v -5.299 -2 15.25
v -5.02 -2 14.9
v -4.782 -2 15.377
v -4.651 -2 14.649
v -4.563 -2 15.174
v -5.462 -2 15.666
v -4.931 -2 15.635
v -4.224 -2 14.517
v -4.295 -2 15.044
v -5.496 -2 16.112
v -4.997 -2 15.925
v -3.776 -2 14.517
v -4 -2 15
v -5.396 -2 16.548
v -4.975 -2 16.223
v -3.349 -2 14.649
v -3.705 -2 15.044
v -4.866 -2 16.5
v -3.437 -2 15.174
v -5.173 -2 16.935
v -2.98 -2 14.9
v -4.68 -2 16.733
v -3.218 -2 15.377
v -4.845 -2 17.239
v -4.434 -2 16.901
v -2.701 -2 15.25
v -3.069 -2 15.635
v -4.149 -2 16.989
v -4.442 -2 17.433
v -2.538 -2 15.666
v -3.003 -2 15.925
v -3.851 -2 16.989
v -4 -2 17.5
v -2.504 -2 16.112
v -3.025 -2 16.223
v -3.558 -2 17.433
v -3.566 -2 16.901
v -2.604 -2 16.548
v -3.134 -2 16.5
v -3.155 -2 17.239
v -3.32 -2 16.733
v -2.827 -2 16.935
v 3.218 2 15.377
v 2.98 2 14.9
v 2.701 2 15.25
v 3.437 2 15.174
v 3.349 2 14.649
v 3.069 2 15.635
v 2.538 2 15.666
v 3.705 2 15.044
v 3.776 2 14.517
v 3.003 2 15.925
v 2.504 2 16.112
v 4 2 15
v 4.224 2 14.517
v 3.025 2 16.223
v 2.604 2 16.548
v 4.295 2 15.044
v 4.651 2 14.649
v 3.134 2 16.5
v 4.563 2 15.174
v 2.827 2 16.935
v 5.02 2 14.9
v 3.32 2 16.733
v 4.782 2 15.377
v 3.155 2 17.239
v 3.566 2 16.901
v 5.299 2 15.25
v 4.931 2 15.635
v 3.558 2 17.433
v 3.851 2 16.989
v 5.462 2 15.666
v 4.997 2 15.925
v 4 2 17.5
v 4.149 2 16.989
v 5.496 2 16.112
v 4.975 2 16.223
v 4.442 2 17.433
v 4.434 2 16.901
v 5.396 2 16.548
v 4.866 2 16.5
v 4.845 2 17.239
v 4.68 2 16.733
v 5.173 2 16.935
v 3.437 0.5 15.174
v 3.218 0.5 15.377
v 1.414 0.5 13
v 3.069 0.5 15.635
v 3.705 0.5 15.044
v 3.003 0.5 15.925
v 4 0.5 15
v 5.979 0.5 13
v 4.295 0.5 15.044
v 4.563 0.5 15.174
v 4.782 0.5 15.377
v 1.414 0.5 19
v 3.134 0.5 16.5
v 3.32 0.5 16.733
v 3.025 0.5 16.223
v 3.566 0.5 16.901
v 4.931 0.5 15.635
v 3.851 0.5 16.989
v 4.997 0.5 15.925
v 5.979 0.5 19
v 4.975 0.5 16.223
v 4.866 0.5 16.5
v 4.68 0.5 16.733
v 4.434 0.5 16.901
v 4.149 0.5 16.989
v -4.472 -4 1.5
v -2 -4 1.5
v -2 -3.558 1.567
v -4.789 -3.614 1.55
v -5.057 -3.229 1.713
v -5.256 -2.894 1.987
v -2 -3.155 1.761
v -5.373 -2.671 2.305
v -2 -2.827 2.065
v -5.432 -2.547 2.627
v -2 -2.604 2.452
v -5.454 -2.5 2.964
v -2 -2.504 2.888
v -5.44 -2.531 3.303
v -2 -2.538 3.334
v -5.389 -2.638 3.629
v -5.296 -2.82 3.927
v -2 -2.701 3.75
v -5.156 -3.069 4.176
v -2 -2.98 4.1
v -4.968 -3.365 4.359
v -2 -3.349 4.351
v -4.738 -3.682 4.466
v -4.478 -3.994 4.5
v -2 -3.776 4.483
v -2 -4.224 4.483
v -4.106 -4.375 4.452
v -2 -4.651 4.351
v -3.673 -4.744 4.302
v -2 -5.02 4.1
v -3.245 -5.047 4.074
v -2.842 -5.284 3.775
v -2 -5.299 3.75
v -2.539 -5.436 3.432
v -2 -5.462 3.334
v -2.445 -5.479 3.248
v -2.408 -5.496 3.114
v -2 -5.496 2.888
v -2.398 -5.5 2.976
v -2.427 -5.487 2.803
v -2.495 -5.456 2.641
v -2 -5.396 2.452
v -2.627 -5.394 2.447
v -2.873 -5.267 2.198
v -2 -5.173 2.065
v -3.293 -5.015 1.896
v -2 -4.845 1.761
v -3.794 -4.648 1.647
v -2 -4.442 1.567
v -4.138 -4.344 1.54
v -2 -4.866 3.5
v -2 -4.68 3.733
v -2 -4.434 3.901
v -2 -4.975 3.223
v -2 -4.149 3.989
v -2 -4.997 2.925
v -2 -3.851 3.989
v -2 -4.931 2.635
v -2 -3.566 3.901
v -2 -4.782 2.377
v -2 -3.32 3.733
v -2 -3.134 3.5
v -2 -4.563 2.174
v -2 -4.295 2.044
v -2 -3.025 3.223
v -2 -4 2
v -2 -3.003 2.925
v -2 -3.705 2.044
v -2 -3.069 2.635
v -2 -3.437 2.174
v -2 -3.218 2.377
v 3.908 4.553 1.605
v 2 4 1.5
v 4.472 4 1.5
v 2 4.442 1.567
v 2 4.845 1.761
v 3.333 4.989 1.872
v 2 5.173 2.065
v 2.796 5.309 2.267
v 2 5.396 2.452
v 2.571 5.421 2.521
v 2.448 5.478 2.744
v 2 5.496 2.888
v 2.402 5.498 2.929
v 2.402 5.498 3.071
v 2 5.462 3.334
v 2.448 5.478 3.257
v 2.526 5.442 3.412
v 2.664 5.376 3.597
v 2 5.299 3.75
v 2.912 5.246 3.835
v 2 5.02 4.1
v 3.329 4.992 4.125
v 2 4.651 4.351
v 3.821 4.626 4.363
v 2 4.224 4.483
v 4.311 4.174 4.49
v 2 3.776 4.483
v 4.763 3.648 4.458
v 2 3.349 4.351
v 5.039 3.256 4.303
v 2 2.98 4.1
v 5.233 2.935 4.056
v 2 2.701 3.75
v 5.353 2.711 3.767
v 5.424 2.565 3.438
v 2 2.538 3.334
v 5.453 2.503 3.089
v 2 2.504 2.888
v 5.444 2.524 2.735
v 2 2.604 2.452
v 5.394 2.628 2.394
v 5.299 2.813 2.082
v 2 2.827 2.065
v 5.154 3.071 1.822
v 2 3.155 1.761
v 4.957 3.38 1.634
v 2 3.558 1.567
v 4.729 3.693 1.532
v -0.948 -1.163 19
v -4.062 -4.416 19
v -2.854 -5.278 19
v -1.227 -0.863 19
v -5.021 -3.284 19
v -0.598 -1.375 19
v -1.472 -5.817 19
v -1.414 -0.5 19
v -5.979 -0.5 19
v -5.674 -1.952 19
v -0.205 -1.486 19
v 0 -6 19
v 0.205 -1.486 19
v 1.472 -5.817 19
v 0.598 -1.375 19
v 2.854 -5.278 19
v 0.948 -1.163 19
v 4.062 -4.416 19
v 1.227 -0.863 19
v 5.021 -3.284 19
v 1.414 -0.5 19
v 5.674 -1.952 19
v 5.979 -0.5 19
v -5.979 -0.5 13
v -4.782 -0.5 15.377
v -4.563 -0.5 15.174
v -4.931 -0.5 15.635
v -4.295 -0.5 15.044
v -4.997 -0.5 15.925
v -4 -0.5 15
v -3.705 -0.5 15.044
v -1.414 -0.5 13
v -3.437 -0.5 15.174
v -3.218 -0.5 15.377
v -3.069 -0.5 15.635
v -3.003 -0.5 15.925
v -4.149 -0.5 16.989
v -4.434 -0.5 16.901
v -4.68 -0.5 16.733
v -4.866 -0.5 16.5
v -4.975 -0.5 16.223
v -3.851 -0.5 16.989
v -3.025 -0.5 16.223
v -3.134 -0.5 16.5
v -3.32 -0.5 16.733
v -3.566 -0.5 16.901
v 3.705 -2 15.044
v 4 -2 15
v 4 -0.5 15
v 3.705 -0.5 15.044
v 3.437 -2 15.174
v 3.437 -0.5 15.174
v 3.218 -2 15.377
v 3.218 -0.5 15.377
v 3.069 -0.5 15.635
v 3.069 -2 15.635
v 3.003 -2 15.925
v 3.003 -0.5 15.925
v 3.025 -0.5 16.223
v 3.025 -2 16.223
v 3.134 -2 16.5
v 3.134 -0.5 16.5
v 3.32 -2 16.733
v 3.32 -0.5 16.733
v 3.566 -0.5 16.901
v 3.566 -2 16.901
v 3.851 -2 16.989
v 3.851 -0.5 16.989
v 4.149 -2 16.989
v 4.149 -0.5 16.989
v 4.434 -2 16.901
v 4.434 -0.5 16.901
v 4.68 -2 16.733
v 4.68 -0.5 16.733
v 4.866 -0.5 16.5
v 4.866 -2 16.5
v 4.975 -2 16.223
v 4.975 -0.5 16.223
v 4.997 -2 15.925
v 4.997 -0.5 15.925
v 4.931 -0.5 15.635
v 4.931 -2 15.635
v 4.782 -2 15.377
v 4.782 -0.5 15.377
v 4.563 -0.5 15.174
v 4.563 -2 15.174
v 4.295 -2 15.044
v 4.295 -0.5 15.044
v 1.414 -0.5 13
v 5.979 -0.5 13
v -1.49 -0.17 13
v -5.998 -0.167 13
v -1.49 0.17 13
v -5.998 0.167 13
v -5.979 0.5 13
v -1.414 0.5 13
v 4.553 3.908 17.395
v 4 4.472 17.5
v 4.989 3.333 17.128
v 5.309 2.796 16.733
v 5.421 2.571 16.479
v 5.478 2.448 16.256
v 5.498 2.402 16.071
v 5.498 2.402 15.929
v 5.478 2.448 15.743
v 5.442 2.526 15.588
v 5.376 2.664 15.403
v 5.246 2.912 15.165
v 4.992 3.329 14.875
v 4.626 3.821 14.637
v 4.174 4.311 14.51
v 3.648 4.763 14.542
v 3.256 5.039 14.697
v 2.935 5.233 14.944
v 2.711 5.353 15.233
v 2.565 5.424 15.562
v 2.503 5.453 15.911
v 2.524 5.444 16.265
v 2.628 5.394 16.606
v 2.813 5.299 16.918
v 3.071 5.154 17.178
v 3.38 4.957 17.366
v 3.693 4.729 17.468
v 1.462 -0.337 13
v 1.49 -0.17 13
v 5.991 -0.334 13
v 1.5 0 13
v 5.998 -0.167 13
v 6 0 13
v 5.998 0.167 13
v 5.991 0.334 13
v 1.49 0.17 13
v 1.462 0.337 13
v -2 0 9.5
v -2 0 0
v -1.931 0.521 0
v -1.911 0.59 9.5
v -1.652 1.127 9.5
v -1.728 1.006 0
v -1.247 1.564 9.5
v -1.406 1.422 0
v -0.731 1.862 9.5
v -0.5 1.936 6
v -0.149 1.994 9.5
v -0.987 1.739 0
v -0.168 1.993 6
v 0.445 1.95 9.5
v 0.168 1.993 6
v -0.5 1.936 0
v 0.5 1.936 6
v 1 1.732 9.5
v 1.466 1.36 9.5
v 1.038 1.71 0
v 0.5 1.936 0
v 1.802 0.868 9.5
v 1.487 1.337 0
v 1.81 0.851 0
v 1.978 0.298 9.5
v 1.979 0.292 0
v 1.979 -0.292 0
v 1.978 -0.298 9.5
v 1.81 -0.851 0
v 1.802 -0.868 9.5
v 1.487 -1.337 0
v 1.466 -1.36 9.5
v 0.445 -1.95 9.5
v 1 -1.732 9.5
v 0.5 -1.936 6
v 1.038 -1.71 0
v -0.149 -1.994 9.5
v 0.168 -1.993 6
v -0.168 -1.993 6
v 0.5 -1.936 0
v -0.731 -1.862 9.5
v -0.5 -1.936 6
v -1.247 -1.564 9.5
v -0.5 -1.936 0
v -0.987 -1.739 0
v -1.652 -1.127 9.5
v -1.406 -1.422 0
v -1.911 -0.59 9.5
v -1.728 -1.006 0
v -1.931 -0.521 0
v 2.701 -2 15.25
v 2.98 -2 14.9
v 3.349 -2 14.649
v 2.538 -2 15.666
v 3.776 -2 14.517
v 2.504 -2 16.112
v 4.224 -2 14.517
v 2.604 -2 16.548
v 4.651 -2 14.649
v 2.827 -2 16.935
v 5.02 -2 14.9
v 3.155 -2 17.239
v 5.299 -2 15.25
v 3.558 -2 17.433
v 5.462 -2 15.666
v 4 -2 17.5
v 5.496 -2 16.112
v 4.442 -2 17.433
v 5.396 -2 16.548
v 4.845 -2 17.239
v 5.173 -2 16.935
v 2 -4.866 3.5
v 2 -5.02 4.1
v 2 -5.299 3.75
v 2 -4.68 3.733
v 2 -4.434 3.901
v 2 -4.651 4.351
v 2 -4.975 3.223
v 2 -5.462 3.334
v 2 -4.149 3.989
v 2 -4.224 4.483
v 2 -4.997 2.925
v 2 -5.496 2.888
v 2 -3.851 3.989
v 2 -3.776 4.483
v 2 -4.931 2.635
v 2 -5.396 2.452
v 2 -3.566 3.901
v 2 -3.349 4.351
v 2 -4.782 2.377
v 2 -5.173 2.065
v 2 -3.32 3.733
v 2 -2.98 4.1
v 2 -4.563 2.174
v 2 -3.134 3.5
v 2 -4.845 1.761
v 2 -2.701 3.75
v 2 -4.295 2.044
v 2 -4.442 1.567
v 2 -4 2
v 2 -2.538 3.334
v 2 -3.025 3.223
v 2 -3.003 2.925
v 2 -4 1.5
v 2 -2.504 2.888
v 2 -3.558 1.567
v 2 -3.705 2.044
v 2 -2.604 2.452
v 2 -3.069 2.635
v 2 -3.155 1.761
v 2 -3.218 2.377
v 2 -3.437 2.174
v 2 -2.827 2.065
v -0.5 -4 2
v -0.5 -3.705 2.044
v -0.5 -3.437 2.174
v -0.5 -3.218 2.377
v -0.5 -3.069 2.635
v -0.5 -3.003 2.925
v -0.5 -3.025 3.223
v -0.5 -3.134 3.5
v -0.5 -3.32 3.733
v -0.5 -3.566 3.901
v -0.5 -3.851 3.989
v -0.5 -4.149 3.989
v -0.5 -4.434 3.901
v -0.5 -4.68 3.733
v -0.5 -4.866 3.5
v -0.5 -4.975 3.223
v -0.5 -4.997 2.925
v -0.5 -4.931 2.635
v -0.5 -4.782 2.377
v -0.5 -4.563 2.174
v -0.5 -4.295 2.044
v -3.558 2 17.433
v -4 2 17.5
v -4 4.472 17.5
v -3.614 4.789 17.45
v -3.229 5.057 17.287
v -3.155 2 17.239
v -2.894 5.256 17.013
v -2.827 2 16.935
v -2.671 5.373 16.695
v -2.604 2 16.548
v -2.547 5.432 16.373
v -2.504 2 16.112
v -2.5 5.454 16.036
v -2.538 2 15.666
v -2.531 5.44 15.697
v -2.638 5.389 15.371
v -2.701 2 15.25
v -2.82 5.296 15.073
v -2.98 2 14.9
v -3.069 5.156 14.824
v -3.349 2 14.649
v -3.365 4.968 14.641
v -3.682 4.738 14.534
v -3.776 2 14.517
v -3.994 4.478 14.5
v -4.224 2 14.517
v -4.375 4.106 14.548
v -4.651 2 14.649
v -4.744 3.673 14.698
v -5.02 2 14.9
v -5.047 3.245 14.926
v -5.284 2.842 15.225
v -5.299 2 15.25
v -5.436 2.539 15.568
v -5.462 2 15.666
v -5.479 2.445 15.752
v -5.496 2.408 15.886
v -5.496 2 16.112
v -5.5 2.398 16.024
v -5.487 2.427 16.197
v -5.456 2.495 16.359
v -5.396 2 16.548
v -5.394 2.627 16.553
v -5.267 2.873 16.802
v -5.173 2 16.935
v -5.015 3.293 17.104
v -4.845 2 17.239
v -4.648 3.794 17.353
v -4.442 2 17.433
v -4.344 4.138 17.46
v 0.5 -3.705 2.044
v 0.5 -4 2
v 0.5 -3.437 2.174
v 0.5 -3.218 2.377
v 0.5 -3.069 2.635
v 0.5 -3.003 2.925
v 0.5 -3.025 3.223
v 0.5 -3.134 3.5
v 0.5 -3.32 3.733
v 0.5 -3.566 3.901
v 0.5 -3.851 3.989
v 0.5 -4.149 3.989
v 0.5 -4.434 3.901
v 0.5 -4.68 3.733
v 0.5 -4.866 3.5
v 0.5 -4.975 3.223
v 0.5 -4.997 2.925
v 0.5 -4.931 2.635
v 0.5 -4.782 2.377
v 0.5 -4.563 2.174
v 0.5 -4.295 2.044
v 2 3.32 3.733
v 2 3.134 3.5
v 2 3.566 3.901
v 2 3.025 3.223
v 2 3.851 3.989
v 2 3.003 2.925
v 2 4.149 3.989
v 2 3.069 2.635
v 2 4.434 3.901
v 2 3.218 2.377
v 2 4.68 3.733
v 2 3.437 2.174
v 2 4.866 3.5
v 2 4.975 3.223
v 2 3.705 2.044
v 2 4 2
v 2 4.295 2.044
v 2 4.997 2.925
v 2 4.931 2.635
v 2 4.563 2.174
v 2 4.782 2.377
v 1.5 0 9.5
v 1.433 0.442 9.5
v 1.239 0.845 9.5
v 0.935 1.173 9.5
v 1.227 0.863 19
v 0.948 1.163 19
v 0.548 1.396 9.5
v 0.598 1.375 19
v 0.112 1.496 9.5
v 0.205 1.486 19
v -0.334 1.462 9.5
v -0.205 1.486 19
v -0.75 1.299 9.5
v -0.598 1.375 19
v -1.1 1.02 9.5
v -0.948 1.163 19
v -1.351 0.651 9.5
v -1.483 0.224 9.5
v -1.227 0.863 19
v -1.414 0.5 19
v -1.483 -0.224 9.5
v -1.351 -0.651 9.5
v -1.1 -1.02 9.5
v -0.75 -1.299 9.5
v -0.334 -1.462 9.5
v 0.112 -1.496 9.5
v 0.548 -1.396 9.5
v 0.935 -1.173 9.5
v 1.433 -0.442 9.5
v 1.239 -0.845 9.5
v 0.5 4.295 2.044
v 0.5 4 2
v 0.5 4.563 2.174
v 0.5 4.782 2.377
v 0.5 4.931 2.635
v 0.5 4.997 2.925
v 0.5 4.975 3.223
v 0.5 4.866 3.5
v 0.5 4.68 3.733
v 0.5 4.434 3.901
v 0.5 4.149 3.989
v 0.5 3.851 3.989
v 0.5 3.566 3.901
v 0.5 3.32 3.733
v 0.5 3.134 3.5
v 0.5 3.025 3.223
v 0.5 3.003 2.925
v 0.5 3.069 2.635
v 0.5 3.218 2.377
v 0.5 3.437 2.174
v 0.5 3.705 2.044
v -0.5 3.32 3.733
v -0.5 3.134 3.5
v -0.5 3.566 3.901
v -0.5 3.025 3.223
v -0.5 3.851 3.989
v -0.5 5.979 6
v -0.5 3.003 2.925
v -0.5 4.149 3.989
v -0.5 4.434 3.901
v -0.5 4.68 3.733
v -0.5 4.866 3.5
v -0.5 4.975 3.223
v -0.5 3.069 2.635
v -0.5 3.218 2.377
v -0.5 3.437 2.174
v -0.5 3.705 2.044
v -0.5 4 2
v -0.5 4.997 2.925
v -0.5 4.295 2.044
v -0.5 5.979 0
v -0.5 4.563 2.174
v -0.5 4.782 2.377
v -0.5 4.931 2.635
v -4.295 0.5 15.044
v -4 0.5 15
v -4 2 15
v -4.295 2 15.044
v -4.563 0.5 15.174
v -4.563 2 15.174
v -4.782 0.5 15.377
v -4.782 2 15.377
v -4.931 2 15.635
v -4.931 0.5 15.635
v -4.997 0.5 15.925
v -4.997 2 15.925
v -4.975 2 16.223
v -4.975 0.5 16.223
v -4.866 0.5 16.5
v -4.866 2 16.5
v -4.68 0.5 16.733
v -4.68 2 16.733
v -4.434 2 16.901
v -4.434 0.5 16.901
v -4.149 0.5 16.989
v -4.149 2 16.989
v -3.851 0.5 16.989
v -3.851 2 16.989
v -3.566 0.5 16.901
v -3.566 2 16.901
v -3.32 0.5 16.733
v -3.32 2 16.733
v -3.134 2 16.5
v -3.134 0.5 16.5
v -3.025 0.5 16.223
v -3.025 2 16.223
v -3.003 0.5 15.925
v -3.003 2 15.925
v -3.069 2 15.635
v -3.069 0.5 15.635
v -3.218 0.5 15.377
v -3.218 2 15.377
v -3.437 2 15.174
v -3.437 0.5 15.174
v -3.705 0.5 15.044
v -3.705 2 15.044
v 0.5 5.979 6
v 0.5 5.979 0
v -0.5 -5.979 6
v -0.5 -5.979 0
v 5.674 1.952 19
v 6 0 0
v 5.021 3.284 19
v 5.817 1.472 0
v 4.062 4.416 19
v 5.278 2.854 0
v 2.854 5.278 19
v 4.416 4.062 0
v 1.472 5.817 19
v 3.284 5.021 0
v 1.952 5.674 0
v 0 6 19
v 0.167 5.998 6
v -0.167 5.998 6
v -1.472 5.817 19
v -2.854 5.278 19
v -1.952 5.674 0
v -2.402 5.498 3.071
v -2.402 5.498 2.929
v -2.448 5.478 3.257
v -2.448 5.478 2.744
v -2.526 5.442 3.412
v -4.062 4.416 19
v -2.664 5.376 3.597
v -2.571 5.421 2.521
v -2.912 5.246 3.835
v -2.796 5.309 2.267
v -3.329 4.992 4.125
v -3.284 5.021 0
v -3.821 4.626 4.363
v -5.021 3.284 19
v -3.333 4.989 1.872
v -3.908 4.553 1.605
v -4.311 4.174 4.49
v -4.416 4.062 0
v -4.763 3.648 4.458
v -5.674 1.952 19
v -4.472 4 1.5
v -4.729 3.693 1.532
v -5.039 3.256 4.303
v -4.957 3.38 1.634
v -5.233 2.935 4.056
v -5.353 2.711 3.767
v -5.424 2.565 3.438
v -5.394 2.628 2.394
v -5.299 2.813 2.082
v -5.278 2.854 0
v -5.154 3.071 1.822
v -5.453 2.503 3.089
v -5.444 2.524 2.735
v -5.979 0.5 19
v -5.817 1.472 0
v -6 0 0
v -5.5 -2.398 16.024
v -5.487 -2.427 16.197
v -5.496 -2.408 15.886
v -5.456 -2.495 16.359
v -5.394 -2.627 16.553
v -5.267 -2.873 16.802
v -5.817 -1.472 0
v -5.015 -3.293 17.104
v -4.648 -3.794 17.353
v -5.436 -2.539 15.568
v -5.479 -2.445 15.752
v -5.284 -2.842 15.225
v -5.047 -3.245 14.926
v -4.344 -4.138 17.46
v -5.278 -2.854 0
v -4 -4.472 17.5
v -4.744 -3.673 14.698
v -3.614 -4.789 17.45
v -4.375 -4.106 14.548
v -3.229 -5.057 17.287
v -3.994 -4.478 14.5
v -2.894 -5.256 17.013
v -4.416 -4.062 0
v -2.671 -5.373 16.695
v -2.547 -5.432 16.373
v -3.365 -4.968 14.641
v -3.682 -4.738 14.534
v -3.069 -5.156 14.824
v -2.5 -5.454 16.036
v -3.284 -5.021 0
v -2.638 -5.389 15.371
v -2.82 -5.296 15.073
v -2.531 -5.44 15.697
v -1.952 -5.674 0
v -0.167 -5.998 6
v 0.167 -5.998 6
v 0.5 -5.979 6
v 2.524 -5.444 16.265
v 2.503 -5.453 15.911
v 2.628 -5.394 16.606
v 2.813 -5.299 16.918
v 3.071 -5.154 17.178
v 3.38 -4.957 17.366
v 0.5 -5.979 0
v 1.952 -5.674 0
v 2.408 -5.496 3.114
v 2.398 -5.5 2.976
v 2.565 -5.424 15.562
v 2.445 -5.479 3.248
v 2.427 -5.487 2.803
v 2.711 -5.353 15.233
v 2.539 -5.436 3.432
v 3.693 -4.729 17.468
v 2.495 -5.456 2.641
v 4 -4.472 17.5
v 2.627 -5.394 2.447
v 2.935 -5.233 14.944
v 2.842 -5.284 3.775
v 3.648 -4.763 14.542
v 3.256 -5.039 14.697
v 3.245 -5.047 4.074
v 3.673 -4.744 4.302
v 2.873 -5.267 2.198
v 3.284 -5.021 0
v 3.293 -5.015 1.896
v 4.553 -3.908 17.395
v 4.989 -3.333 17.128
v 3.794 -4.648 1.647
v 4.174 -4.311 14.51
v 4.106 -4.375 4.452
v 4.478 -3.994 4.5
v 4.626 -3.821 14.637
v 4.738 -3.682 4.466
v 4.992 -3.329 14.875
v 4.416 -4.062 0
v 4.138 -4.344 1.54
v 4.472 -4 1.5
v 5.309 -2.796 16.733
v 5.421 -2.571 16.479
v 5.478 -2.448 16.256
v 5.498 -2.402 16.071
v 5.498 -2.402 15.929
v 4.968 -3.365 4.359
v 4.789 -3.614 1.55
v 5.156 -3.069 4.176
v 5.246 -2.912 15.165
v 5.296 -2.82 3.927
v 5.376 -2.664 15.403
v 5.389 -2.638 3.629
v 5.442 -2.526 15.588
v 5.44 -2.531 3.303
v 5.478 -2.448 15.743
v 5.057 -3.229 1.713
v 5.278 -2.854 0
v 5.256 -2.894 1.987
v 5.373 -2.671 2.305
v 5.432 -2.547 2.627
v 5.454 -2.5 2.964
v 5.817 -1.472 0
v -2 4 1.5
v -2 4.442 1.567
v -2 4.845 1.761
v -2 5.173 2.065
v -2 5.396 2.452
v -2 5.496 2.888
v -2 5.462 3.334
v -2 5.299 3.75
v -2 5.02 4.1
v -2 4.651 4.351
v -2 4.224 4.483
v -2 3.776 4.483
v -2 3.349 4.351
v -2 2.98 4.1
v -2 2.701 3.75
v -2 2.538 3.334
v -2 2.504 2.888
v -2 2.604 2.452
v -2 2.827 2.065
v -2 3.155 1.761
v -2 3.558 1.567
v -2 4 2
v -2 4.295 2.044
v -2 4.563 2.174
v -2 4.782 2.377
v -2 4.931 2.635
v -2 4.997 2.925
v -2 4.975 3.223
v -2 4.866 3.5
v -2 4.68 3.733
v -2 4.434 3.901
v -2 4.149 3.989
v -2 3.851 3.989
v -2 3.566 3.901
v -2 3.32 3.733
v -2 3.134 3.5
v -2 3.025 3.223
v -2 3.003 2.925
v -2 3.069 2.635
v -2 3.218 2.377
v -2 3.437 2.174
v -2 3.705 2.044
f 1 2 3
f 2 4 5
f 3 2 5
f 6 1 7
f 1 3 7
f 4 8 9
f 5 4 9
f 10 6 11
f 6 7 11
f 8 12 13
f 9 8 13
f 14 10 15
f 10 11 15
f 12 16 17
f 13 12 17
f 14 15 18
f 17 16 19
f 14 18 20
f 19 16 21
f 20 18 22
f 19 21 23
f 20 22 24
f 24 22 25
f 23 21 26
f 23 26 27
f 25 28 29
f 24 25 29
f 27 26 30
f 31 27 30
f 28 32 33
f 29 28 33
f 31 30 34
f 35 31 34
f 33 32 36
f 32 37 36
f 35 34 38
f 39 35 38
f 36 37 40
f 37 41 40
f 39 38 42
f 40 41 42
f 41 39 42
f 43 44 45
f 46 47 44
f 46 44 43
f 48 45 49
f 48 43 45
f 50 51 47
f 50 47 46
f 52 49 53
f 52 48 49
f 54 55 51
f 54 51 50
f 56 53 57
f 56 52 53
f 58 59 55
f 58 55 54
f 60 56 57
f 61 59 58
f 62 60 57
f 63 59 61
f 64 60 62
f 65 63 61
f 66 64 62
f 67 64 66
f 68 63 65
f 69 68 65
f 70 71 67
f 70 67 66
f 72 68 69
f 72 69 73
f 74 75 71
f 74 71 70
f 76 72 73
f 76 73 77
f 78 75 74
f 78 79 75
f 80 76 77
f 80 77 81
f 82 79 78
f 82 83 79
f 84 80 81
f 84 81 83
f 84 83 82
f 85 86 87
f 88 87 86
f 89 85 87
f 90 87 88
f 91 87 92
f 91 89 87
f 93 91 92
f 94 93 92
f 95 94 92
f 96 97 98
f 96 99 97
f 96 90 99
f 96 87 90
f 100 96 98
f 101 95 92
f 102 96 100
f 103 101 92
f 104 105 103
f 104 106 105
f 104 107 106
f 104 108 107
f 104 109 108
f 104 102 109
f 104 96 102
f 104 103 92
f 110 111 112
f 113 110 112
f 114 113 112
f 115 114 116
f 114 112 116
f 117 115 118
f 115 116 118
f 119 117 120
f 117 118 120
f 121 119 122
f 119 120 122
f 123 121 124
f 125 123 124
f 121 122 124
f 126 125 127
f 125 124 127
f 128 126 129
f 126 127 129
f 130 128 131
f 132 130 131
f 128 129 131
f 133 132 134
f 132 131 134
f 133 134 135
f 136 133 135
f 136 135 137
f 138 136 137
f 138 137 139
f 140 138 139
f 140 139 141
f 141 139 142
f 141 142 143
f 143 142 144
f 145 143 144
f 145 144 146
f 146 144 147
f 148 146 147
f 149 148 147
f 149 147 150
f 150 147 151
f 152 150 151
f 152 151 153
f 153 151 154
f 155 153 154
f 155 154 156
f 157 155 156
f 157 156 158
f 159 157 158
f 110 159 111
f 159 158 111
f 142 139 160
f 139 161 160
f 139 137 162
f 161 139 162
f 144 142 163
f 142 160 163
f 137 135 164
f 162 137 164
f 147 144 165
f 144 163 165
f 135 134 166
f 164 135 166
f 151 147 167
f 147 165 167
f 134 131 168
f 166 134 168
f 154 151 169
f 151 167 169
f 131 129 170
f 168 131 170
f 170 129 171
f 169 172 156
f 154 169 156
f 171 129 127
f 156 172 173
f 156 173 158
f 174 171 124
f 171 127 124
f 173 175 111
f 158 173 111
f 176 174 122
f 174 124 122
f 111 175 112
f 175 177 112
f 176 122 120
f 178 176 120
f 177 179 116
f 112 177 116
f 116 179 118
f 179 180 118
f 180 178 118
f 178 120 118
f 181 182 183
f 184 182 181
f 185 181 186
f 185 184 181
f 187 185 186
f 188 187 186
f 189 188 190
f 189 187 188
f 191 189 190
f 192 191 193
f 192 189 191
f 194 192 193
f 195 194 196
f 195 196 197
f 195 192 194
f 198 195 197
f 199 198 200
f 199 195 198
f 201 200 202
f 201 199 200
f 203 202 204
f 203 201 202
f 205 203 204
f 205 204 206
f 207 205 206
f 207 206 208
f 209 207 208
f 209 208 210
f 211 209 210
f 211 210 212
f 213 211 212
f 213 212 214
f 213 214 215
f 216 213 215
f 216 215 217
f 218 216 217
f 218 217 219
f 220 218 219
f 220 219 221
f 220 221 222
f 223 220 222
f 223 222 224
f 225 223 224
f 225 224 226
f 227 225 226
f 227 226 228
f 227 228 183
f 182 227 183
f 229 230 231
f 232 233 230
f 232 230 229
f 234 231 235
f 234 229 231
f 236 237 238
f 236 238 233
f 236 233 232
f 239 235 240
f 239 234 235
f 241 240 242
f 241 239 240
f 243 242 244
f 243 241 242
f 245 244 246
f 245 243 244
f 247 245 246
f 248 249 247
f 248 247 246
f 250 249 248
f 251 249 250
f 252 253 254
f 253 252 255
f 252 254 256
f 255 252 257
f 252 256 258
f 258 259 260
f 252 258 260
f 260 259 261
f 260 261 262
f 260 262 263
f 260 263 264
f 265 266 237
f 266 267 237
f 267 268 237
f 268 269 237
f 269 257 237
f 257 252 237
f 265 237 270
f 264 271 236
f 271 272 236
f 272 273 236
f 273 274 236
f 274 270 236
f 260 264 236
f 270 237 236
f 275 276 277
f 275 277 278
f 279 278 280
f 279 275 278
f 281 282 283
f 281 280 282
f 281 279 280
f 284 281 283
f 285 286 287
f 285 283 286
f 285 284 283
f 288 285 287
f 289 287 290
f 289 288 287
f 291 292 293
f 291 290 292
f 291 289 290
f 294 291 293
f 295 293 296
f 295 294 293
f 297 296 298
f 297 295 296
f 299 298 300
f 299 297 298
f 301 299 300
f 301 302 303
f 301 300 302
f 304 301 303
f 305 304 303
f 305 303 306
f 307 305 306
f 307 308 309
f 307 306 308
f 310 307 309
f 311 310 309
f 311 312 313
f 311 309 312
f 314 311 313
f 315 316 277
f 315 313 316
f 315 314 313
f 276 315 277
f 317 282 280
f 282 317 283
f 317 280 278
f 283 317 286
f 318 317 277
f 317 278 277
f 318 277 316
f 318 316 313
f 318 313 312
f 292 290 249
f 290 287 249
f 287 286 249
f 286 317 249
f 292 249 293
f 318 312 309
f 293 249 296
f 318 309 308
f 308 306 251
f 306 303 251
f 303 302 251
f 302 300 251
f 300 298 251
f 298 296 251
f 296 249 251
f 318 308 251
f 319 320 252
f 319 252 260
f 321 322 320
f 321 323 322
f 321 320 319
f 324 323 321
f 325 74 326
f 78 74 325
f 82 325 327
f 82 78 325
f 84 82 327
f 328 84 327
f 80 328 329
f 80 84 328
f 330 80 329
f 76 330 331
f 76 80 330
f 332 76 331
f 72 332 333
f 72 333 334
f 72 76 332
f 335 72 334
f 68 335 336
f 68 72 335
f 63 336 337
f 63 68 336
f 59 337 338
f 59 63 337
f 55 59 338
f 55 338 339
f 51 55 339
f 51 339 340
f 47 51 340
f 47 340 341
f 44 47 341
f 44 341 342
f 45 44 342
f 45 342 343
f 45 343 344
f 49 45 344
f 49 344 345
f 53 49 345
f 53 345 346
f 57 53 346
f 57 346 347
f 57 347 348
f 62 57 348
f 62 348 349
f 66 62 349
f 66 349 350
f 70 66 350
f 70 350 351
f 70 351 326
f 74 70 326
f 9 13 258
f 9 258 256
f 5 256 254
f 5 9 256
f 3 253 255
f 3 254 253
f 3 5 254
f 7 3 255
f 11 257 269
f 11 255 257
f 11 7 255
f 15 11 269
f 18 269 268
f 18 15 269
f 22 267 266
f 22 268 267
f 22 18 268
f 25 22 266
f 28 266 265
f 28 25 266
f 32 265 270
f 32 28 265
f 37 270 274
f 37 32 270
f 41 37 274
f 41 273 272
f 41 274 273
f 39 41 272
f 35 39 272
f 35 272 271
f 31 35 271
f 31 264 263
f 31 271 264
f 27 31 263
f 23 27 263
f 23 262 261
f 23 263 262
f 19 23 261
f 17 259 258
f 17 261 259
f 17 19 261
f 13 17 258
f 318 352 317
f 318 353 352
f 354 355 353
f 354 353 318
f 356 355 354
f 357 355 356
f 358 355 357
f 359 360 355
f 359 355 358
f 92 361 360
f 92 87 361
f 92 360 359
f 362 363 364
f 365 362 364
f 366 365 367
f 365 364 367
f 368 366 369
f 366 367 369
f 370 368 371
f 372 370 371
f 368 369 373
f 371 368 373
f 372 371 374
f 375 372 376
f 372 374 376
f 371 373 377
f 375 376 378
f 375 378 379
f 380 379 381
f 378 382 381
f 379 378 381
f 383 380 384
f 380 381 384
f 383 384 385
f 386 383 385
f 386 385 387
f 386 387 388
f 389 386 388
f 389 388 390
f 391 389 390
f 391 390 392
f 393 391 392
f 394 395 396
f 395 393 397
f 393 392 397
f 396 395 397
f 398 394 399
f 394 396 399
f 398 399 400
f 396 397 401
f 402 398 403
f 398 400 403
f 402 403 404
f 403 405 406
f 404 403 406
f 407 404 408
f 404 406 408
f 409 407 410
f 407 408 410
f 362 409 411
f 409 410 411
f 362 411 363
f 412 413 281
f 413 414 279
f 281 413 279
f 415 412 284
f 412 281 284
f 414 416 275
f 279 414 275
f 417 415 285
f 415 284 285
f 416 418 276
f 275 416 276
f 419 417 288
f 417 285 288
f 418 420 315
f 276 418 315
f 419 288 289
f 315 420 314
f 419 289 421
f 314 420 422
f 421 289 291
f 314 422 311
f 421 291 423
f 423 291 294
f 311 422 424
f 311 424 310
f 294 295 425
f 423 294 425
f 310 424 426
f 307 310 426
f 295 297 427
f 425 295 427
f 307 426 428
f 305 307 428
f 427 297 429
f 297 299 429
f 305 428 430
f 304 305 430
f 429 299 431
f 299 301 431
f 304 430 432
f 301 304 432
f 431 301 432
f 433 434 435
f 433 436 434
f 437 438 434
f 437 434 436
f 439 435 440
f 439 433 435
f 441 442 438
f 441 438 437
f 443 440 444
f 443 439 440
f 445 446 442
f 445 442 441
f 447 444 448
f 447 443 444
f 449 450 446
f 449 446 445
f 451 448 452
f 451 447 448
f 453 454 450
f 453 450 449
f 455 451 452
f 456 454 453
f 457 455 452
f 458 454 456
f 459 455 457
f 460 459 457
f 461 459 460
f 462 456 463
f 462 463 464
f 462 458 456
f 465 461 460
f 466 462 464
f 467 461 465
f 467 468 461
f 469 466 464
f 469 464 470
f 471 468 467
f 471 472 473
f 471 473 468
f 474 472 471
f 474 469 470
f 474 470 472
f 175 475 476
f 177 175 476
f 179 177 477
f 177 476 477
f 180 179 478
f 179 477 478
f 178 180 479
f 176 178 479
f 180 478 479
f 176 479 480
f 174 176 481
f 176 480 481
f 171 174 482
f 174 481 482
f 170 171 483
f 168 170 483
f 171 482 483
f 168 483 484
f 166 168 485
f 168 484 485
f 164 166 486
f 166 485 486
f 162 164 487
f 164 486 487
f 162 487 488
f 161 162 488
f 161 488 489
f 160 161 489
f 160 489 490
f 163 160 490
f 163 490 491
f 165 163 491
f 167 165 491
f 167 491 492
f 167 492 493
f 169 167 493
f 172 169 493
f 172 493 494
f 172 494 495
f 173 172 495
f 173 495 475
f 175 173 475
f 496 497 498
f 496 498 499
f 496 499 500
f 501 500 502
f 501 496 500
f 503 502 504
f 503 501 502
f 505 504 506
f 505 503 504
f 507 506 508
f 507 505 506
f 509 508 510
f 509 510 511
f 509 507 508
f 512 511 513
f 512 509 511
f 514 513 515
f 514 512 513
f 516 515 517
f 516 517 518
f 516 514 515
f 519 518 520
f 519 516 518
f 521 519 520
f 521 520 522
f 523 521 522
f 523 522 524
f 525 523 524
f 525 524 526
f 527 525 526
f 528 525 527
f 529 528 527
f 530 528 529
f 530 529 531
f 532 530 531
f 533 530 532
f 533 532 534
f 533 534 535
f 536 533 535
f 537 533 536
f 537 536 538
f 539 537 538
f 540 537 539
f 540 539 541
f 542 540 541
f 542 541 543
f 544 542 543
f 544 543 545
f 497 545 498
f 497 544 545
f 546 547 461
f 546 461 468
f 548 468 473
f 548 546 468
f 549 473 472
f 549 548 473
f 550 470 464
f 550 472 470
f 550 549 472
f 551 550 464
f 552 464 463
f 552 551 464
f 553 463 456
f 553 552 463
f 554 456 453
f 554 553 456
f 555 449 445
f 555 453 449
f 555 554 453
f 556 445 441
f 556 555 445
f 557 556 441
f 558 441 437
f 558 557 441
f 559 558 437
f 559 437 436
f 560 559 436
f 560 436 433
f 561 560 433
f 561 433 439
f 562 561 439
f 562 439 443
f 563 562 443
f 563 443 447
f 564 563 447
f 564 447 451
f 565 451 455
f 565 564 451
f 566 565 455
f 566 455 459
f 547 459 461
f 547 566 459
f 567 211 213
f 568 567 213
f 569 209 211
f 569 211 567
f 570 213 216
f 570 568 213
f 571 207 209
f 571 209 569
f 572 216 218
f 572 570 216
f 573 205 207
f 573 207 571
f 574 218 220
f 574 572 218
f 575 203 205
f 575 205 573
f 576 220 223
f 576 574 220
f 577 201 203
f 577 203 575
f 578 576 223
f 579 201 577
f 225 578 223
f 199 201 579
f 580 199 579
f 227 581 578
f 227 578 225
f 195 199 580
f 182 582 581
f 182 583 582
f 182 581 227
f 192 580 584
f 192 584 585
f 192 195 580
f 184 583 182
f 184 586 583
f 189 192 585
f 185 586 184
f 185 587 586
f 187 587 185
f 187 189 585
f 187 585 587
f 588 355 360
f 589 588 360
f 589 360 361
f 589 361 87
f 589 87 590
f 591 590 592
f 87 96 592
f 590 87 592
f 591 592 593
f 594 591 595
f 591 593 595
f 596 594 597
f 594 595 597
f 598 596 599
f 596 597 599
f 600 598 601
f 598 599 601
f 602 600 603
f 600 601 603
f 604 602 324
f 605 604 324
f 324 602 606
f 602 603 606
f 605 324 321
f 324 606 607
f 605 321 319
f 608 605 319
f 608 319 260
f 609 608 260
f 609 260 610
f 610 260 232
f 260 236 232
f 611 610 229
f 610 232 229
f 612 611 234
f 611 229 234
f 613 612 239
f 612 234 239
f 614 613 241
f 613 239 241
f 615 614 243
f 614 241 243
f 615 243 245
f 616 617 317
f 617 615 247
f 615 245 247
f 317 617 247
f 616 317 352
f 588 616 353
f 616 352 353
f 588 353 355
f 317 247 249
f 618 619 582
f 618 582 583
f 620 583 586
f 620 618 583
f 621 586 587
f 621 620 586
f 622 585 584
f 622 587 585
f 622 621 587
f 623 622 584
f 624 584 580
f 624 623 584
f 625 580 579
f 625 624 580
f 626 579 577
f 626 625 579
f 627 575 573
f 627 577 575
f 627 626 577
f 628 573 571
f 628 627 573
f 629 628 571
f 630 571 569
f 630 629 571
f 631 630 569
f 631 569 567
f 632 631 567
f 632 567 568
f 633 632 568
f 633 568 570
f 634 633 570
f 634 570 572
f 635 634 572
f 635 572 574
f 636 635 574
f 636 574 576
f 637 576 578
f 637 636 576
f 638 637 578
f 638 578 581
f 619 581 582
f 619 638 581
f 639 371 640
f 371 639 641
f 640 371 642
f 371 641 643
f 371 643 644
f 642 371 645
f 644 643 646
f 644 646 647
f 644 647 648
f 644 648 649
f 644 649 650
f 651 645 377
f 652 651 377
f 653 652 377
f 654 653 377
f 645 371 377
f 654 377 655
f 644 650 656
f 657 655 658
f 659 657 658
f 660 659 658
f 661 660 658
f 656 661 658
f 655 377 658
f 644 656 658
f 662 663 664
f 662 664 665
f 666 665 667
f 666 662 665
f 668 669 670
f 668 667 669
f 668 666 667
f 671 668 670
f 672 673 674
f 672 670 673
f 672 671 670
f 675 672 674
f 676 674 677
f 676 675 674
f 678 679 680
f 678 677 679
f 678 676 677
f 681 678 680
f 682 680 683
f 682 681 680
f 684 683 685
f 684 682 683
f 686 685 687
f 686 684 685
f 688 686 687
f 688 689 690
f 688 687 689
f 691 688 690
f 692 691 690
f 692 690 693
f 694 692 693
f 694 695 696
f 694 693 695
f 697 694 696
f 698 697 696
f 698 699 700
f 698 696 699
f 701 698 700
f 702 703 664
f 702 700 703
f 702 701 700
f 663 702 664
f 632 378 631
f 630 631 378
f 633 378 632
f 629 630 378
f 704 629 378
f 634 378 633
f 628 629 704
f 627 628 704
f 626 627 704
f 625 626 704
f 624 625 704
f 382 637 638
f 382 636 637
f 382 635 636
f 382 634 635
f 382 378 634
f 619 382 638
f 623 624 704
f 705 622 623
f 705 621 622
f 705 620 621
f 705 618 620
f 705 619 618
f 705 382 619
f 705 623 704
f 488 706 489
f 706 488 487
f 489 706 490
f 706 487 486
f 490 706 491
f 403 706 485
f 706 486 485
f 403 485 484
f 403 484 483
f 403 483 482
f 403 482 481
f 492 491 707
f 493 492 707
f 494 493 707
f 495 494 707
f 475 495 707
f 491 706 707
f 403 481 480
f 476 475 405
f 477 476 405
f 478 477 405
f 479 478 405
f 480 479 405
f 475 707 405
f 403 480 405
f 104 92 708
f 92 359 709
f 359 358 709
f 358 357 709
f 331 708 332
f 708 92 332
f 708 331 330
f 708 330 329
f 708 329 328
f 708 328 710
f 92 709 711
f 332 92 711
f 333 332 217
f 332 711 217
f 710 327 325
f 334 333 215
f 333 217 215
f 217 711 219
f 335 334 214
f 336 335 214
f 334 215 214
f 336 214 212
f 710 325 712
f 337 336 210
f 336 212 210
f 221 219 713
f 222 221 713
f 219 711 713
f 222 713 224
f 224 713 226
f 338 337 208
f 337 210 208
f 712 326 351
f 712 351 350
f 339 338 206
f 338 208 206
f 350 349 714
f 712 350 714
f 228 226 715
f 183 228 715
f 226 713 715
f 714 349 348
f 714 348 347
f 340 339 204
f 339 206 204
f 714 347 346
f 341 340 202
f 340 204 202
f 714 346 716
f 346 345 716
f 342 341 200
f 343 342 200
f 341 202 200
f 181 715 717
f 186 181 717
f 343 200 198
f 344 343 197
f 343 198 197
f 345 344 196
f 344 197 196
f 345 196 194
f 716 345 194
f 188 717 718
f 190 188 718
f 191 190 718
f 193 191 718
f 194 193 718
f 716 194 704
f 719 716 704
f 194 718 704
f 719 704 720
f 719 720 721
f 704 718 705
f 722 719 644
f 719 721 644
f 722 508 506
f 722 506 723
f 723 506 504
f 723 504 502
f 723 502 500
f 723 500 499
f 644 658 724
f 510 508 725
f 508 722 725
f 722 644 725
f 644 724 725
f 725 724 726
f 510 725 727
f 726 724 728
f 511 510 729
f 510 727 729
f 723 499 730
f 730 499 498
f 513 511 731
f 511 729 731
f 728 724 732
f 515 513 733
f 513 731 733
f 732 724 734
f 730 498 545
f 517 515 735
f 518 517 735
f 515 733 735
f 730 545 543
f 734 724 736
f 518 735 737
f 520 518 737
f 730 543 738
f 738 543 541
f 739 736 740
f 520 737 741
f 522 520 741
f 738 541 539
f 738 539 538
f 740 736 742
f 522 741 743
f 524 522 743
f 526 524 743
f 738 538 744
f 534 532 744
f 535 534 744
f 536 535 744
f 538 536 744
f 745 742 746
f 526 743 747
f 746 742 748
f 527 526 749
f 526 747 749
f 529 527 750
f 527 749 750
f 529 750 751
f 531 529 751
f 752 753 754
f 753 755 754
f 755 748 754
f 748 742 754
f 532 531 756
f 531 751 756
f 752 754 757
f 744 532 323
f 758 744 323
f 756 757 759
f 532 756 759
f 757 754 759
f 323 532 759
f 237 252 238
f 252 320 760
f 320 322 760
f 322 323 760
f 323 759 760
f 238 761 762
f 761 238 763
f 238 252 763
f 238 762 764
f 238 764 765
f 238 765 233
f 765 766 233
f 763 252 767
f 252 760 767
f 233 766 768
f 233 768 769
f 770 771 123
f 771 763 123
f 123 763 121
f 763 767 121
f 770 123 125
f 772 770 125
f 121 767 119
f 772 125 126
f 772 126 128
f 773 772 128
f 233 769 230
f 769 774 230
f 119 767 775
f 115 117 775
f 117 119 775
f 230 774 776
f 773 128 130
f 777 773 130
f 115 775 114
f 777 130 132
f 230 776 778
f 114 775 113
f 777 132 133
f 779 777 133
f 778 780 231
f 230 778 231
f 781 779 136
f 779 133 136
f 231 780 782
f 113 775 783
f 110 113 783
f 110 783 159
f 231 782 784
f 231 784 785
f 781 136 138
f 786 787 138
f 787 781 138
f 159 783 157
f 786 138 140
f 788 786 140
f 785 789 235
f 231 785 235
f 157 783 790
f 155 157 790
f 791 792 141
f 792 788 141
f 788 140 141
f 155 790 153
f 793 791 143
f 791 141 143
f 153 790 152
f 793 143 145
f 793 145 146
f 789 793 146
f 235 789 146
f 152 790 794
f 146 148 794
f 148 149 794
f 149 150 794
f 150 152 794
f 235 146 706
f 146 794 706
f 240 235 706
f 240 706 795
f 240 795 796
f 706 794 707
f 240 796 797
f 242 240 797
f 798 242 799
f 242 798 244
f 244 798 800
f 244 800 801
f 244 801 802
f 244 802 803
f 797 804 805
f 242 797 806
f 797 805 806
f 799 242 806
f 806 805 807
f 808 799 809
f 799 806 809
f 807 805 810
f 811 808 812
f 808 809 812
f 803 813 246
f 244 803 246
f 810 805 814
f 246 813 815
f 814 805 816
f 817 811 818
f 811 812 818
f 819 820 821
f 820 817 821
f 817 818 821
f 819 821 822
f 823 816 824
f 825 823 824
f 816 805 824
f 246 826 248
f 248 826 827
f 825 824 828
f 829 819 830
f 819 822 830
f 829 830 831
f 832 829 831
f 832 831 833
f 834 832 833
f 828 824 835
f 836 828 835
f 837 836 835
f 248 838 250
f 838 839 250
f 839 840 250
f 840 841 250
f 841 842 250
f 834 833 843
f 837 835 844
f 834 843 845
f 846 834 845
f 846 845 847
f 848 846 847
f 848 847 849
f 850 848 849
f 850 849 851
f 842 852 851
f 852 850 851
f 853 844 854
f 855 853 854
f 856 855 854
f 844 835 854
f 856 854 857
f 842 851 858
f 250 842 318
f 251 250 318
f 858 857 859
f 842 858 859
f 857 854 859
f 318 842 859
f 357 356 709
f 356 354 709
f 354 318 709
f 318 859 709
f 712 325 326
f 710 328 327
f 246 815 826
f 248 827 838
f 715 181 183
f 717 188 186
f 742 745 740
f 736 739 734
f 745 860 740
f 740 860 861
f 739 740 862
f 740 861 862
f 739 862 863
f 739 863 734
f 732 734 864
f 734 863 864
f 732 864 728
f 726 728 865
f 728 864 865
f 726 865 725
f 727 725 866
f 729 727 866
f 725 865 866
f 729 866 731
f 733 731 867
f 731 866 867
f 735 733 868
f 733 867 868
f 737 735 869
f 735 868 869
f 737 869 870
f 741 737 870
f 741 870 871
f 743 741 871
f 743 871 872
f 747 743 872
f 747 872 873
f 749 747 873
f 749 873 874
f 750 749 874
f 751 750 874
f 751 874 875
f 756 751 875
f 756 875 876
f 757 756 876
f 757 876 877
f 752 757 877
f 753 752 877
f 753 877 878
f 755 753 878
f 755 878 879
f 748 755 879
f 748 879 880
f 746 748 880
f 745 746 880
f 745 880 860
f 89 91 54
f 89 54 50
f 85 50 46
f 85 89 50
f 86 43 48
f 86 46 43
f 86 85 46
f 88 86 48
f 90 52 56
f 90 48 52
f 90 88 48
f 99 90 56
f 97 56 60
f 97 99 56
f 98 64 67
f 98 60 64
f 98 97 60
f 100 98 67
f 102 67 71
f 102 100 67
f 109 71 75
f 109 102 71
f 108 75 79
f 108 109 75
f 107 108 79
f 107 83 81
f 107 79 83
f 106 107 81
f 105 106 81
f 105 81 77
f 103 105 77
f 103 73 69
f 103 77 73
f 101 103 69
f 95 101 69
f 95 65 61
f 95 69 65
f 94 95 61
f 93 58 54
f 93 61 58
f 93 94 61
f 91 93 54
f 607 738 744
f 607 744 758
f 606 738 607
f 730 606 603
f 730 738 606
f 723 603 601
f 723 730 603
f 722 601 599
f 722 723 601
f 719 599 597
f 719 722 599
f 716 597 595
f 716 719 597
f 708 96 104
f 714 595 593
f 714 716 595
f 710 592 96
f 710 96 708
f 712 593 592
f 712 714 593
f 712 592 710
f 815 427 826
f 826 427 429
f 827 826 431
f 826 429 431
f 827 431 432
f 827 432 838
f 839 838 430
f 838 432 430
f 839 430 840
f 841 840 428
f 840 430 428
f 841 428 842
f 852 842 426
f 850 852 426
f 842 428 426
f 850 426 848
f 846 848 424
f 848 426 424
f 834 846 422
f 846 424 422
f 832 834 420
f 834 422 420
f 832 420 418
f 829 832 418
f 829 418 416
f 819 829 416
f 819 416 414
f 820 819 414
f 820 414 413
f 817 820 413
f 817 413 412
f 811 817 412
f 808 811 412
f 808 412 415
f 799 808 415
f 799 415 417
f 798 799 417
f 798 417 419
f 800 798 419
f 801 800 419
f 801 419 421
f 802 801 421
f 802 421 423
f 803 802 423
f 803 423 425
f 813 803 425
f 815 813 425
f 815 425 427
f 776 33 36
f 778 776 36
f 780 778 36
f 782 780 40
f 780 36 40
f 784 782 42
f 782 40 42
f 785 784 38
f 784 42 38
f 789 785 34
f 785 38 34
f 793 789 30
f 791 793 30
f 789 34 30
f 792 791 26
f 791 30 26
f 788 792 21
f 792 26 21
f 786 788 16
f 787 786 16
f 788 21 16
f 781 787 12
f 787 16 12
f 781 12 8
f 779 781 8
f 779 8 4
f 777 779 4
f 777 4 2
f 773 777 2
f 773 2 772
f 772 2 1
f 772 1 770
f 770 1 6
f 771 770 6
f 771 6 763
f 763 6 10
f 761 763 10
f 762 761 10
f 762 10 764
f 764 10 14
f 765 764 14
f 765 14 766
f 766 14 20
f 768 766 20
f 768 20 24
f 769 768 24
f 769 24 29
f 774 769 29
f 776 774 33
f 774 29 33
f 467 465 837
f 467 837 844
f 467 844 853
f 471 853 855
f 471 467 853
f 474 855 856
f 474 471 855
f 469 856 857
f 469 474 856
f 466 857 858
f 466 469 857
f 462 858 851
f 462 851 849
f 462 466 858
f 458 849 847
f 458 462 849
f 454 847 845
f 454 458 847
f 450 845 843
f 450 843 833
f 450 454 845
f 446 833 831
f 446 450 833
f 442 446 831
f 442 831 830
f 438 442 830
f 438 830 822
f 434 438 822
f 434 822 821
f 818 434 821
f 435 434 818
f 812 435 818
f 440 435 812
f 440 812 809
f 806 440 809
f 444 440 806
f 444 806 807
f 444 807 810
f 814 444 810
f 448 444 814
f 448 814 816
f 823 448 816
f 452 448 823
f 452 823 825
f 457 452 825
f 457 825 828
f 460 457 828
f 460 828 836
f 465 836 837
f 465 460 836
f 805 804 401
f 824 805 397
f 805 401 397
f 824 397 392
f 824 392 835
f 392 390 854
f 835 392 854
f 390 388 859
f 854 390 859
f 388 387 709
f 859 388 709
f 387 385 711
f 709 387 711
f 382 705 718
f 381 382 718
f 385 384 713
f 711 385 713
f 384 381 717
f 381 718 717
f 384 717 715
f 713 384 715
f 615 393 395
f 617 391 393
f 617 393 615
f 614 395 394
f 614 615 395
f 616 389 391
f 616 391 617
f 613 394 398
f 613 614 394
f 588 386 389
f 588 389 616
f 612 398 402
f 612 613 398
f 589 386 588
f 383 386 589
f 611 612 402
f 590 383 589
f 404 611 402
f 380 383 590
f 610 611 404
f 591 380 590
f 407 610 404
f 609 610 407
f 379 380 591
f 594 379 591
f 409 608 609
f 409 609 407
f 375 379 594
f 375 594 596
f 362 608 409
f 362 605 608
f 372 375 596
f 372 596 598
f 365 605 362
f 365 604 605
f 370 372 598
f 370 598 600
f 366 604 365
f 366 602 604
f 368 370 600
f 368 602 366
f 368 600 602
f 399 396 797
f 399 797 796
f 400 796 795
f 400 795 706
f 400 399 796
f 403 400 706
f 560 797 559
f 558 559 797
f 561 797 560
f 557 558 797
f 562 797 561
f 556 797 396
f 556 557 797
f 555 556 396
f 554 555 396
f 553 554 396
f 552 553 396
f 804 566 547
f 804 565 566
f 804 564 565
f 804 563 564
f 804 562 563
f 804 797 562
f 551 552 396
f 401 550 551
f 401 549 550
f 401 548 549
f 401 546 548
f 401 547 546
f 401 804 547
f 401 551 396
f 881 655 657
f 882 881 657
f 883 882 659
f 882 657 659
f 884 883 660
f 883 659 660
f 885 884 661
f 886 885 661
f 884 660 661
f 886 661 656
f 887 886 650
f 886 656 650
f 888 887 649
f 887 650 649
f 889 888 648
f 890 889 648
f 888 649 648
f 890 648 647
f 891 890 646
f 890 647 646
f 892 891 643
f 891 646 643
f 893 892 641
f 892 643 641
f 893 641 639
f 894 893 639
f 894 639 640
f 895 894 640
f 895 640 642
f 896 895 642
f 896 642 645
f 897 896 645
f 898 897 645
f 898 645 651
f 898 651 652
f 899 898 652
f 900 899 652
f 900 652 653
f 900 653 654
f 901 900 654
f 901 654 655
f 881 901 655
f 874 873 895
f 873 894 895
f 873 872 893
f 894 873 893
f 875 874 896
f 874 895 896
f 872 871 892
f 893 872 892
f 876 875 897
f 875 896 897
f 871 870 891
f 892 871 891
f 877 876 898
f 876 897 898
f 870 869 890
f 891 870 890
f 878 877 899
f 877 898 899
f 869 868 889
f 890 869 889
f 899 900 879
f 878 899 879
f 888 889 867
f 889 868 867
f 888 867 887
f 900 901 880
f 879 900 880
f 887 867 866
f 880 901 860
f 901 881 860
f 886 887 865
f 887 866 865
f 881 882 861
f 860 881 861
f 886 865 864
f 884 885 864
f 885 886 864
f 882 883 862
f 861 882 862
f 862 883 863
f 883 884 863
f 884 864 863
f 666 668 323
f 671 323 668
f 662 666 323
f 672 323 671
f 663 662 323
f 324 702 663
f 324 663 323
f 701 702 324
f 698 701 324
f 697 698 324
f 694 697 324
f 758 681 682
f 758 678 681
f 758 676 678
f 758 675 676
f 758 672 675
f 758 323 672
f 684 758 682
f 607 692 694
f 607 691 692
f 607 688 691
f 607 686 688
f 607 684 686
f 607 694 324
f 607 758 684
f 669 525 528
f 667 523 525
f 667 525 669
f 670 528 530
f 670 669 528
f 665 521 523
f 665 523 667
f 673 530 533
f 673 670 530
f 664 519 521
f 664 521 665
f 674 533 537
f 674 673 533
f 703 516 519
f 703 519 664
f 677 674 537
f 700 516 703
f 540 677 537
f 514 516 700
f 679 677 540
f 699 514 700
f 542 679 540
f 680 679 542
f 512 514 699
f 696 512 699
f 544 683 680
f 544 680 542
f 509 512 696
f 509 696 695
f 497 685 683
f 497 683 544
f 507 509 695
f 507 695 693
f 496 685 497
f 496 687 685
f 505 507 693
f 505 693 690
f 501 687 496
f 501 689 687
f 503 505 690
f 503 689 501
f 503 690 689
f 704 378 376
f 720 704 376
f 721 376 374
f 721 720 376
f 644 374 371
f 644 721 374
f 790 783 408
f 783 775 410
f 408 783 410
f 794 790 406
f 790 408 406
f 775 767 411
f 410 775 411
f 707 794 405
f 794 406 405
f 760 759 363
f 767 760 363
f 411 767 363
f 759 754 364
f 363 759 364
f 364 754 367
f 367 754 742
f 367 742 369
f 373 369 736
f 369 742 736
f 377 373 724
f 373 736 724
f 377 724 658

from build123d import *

# Parameters (mm, degrees)
SKETCH_1_R               = 6
EXTRUDE_1_DEPTH          = 19
SKETCH_2_R               = 1.5
CUT_EXTRUDE_1_DEPTH      = 9.5
SKETCH_3_W               = 13.627836578
SKETCH_3_H               = 1
CUT_EXTRUDE_2_DEPTH      = 6
SKETCH_4_W               = 1
SKETCH_4_H               = 12.796097453
CUT_EXTRUDE_3_DEPTH      = 6
CUT_EXTRUDE_5_DEPTH      = 6
CUT_EXTRUDE_5_DEPTH_BACK = 6
SKETCH_5_R               = 1
CUT_EXTRUDE_START        = -2
SKETCH_6_R               = 1.5
CUT_EXTRUDE_6_DEPTH      = 6
SKETCH_7_R               = 1
CUT_EXTRUDE_7_DEPTH      = 6
SKETCH_8_R               = 1.5
CUT_EXTRUDE_8_DEPTH      = 6
SKETCH_9_R               = 2
CUT_EXTRUDE_9_DEPTH      = 9.5


with BuildPart() as part:
    # 草图1 → 凸台-拉伸1 (new body)
    with BuildSketch(Plane.XY):
        Circle(SKETCH_1_R)
    extrude(amount=EXTRUDE_1_DEPTH)

    # 草图2 → 切除-拉伸1 (cut)
    with BuildSketch(Plane.XY.offset(19)):
        Circle(SKETCH_2_R)
    extrude(amount=-CUT_EXTRUDE_1_DEPTH, mode=Mode.SUBTRACT)

    # 草图3 → 切除-拉伸2 (cut)
    with BuildSketch(Plane.XY.offset(19)):
        with Locations((-0.190601878, 0)):
            Rectangle(SKETCH_3_W, SKETCH_3_H)
    extrude(amount=-CUT_EXTRUDE_2_DEPTH, mode=Mode.SUBTRACT)

    # 草图4 → 切除-拉伸3 (cut)
    with BuildSketch(Plane(origin=(0, 0, 0), x_dir=(-1, 0, 0), z_dir=(0, 0, -1))):
        with Locations((0, -0.108476873)):
            Rectangle(SKETCH_4_W, SKETCH_4_H)
    extrude(amount=-CUT_EXTRUDE_3_DEPTH, mode=Mode.SUBTRACT)

    # 草图5 → 切除-拉伸5 (cut, two sides: drawn at the far end of the back side and taken through both)
    with BuildSketch(Plane(origin=(0, 0, 0), x_dir=(1, 0, 0), z_dir=(0, 1, 0)).offset(-CUT_EXTRUDE_5_DEPTH_BACK)):
        with Locations(Location((-4, -16, 0), (0, 0, 90))):
            Circle(SKETCH_5_R)
        with Locations(Location((4, -16, 0), (0, 0, 90))):
            Circle(SKETCH_5_R)
    extrude(amount=CUT_EXTRUDE_5_DEPTH + CUT_EXTRUDE_5_DEPTH_BACK, mode=Mode.SUBTRACT)

    # 草图6 → 切除-拉伸6 (cut)
    with BuildSketch(Plane(origin=(0, 0, 0), x_dir=(1, 0, 0), z_dir=(0, 1, 0)).offset(CUT_EXTRUDE_START)):
        with Locations(Location((-4, -16, 0), (0, 0, 270))):
            Circle(SKETCH_6_R)
        with Locations(Location((4, -16, 0), (0, 0, 270))):
            Circle(SKETCH_6_R)
    cut_extrude_6 = extrude(amount=-CUT_EXTRUDE_6_DEPTH, mode=Mode.SUBTRACT)

    # 镜向1: 切除-拉伸6 across plane
    add(cut_extrude_6.mirror(Plane.ZX), mode=Mode.SUBTRACT)

    # 草图7 → 切除-拉伸7 (cut)
    with BuildSketch(Plane(origin=(0, 0, 0), x_dir=(0, 0, -1), z_dir=(1, 0, 0))):
        with Locations((-3, 4)):
            Circle(SKETCH_7_R)
        with Locations((-3, -4)):
            Circle(SKETCH_7_R)
    cut_extrude_7 = extrude(amount=-CUT_EXTRUDE_7_DEPTH, mode=Mode.SUBTRACT)

    # 草图8 → 切除-拉伸8 (cut)
    with BuildSketch(Plane(origin=(0, 0, 0), x_dir=(0, 0, -1), z_dir=(1, 0, 0)).offset(CUT_EXTRUDE_START)):
        with Locations((-3, -4)):
            Circle(SKETCH_8_R)
        with Locations((-3, 4)):
            Circle(SKETCH_8_R)
    cut_extrude_8 = extrude(amount=-CUT_EXTRUDE_8_DEPTH, mode=Mode.SUBTRACT)

    # 镜向2: 切除-拉伸7, 切除-拉伸8 across plane
    add(cut_extrude_7.mirror(Plane(origin=(0, 0, 0), x_dir=(0, 0, 1), z_dir=(1, 0, 0))), mode=Mode.SUBTRACT)
    add(cut_extrude_8.mirror(Plane(origin=(0, 0, 0), x_dir=(0, 0, 1), z_dir=(1, 0, 0))), mode=Mode.SUBTRACT)

    # 草图9 → 切除-拉伸9 (cut)
    with BuildSketch(Plane(origin=(0, 0, 0), x_dir=(-1, 0, 0), z_dir=(0, 0, -1))):
        Circle(SKETCH_9_R)
    extrude(amount=-CUT_EXTRUDE_9_DEPTH, mode=Mode.SUBTRACT)


solid = part.part
